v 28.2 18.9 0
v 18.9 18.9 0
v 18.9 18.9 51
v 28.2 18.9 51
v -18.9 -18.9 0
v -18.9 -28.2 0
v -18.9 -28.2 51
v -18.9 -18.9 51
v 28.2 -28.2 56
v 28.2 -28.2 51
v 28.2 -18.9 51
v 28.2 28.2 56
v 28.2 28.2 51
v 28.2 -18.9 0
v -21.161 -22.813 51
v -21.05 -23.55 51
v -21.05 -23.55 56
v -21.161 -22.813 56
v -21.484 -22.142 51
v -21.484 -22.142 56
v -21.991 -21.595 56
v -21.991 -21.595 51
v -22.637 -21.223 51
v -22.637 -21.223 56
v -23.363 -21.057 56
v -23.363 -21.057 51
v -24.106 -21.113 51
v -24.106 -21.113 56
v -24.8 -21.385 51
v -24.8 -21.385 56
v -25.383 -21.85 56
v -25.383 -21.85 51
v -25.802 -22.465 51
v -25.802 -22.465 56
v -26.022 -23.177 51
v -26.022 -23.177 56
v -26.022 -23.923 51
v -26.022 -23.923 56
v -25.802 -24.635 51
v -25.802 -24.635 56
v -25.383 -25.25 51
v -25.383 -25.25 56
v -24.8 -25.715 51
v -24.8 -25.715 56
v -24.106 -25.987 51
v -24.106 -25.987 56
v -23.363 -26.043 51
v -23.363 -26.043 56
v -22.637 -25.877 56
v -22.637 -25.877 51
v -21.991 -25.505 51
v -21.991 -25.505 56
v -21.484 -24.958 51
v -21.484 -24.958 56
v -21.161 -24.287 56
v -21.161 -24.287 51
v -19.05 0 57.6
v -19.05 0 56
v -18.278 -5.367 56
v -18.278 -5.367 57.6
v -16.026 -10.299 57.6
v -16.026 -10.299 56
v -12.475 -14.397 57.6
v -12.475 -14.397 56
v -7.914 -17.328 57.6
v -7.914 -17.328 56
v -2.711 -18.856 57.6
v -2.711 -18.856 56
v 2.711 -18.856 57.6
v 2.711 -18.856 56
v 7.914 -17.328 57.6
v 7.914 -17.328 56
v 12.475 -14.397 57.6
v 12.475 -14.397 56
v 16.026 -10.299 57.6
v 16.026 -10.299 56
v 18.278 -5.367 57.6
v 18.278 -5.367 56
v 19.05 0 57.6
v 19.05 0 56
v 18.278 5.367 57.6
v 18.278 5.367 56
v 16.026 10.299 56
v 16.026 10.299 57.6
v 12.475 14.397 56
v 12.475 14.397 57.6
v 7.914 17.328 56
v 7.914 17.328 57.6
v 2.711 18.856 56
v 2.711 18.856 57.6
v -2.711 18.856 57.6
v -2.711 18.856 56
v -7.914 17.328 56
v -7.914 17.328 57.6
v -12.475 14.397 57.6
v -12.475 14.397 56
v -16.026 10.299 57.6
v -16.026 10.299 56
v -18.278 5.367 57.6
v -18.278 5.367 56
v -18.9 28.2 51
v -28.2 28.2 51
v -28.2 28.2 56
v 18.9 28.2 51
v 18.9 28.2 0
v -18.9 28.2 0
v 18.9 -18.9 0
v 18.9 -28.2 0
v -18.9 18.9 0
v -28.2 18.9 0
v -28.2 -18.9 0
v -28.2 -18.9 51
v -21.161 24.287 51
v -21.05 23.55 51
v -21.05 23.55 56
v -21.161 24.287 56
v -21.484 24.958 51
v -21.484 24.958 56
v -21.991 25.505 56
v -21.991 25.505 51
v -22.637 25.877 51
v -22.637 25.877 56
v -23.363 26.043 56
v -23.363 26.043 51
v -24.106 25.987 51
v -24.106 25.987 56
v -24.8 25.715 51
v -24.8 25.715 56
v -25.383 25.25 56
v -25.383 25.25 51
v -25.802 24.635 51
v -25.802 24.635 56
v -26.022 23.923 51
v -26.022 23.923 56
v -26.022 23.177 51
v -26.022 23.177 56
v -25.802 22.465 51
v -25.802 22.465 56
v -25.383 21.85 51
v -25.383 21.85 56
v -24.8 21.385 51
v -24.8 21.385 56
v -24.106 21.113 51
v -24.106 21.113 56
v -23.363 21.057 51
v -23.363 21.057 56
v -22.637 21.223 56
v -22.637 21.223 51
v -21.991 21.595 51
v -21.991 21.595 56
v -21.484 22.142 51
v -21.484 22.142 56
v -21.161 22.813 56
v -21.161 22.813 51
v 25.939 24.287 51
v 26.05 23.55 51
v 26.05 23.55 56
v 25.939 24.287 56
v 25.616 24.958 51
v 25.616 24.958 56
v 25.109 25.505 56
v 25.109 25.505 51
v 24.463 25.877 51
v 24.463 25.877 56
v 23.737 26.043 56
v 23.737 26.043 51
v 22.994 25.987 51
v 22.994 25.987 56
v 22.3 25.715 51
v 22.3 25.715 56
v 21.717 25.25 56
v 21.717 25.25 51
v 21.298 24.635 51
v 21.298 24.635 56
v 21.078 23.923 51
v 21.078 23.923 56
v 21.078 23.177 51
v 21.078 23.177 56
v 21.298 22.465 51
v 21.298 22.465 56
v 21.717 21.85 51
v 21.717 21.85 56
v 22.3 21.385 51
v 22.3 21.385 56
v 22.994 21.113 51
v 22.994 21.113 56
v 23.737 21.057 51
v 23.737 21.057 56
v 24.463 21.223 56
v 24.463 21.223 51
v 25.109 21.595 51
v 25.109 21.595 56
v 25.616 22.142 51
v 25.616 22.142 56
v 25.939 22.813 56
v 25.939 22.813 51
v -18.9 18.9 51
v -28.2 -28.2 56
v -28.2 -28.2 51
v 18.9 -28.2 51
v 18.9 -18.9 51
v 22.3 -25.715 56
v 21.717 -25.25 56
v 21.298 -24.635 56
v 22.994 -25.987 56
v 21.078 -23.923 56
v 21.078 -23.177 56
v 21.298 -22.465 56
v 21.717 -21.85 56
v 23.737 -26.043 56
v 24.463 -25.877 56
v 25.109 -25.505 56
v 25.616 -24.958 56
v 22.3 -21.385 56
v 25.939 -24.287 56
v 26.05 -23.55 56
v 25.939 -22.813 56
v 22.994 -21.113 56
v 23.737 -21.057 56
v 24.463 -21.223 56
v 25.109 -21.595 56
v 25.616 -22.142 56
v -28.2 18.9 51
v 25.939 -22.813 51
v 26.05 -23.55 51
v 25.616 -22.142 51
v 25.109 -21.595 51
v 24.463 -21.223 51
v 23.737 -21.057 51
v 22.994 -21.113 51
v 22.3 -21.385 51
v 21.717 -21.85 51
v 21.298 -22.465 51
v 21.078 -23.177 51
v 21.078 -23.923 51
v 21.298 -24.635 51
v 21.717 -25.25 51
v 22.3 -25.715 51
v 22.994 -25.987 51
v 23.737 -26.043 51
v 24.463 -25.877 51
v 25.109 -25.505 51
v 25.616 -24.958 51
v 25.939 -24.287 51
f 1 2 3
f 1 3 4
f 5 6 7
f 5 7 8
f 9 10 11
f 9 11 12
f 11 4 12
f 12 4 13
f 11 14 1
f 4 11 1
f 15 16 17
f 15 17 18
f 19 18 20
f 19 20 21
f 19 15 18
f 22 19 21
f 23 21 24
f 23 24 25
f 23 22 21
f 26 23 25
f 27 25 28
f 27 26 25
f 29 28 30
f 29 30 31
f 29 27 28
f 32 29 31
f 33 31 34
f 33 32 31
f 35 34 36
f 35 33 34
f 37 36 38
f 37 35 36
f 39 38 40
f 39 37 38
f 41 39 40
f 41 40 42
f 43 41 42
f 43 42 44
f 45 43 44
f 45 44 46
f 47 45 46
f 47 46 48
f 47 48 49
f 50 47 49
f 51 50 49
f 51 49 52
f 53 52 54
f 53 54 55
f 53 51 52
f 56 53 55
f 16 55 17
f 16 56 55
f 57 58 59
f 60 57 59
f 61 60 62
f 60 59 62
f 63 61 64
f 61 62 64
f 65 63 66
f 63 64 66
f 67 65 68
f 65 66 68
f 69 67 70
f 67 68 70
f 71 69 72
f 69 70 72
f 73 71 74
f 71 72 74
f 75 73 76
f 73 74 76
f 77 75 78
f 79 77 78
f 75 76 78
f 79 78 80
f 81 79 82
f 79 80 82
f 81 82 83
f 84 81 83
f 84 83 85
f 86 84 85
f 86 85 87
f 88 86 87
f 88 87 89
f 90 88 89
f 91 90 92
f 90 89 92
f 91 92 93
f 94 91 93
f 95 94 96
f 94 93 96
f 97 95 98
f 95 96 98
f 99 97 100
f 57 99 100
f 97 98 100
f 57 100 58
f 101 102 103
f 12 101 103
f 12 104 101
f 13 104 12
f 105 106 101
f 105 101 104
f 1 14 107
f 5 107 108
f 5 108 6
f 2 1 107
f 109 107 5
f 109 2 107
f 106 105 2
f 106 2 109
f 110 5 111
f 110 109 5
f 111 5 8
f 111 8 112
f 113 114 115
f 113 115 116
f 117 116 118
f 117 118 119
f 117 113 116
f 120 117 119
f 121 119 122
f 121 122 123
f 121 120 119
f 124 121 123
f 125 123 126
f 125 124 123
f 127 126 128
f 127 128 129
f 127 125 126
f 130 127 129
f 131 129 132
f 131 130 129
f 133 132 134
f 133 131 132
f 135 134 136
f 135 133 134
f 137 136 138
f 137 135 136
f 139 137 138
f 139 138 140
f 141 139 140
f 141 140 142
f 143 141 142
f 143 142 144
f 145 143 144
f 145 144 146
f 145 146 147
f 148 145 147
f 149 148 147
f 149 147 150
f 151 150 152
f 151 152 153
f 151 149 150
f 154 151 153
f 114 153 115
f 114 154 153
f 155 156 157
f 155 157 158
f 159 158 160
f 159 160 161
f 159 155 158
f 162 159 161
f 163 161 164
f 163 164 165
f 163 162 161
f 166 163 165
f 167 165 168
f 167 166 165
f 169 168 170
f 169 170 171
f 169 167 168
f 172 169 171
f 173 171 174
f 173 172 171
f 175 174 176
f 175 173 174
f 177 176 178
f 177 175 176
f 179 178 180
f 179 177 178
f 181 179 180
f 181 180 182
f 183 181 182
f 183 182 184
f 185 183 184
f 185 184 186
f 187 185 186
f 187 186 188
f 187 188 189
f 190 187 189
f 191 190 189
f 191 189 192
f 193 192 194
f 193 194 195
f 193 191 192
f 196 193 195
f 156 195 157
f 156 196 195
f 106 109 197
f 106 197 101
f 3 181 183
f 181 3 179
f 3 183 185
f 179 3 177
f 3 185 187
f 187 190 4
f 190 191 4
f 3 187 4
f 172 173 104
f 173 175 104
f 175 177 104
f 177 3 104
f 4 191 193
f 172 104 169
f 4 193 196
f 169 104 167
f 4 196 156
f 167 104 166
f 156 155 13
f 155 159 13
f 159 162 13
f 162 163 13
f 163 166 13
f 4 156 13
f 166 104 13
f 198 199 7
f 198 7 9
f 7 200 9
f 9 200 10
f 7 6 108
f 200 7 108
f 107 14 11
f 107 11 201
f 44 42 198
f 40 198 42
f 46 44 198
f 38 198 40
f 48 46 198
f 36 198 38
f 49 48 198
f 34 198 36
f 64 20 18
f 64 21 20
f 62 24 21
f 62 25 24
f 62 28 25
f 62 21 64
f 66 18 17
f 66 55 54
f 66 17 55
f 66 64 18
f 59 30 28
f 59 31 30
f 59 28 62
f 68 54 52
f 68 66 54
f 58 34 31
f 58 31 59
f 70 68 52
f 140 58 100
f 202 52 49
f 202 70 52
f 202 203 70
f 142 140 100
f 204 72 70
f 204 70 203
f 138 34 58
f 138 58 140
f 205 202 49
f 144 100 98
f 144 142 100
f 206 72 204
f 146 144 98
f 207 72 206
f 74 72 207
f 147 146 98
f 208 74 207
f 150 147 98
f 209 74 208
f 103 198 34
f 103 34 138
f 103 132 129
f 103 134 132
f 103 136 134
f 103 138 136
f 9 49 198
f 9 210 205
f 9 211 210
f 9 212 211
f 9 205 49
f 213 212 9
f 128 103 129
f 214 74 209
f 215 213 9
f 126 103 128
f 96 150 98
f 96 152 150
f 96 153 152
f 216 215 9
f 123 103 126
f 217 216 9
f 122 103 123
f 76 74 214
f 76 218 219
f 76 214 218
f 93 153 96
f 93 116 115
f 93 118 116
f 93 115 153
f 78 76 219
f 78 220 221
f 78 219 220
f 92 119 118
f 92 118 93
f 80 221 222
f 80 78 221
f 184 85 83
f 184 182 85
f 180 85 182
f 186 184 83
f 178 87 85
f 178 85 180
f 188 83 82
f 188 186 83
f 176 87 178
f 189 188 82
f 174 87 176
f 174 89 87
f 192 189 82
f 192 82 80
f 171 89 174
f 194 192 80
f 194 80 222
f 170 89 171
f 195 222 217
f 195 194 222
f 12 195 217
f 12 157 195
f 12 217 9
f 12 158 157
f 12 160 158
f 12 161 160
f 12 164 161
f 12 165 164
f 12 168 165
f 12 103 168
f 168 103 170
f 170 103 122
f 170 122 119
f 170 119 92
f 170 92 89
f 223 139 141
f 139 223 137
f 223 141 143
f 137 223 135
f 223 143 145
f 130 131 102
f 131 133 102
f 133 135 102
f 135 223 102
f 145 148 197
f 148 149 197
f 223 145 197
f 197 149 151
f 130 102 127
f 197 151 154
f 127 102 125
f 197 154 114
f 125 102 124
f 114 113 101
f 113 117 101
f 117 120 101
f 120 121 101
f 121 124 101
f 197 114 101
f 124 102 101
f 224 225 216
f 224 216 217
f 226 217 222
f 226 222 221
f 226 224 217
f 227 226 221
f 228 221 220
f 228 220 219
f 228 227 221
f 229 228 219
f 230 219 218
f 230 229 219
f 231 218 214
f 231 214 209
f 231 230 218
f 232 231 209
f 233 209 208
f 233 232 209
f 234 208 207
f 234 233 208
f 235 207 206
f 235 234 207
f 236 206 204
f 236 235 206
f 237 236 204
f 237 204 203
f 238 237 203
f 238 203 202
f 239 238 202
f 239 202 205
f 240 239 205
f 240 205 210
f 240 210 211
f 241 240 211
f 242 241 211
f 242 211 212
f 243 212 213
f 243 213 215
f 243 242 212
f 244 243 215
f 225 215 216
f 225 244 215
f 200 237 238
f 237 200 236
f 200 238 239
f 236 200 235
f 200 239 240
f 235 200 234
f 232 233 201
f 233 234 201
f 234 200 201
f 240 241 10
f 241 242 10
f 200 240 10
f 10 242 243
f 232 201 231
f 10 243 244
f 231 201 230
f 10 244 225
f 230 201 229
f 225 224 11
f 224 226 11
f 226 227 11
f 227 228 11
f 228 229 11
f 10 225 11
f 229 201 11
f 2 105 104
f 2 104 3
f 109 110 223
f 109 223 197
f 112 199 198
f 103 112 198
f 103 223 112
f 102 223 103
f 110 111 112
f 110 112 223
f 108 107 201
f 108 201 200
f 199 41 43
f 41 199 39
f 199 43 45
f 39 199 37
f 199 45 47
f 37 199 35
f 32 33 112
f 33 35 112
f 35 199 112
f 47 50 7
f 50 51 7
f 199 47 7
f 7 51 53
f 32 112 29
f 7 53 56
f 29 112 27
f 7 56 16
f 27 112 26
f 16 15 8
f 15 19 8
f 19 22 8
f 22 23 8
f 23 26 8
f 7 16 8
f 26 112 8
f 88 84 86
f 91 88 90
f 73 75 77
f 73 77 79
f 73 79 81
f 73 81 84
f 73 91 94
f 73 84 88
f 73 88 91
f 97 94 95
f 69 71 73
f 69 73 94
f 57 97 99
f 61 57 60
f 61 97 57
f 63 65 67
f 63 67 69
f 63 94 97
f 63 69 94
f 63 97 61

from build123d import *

# Parameters (mm, degrees)
BOSS_EXTRUDE2_DEPTH = 51
SKETCH3_W           = 56.4
SKETCH3_H           = 56.4
SKETCH3_R           = 2.5
BOSS_EXTRUDE3_DEPTH = 5
SKETCH4_R           = 19.05
BOSS_EXTRUDE4_DEPTH = 1.6


with BuildPart() as part:
    # Sketch2 → Boss-Extrude2 (new body)
    with BuildSketch(Plane.XY):
        Polygon((-18.9, 28.2), (18.9, 28.2), (18.9, 18.9), (28.2, 18.9), (28.2, -18.9), (18.9, -18.9), (18.9, -28.2), (-18.9, -28.2), (-18.9, -18.9), (-28.2, -18.9), (-28.2, 18.9), (-18.9, 18.9), align=None)
    extrude(amount=BOSS_EXTRUDE2_DEPTH)

    # Sketch3 → Boss-Extrude3 (add)
    with BuildSketch(Plane.XY.offset(51)):
        Rectangle(SKETCH3_W, SKETCH3_H)
        with Locations((-23.55, 23.55)):
            Circle(SKETCH3_R, mode=Mode.SUBTRACT)
        with Locations((23.55, 23.55)):
            Circle(SKETCH3_R, mode=Mode.SUBTRACT)
        with Locations((23.55, -23.55)):
            Circle(SKETCH3_R, mode=Mode.SUBTRACT)
        with Locations((-23.55, -23.55)):
            Circle(SKETCH3_R, mode=Mode.SUBTRACT)
    extrude(amount=BOSS_EXTRUDE3_DEPTH)

    # Sketch4 → Boss-Extrude4 (add)
    with BuildSketch(Plane.XY.offset(56)):
        with Locations(Location((0, 0, 0), (0, 0, 180))):
            Circle(SKETCH4_R)
    extrude(amount=BOSS_EXTRUDE4_DEPTH)


solid = part.part
